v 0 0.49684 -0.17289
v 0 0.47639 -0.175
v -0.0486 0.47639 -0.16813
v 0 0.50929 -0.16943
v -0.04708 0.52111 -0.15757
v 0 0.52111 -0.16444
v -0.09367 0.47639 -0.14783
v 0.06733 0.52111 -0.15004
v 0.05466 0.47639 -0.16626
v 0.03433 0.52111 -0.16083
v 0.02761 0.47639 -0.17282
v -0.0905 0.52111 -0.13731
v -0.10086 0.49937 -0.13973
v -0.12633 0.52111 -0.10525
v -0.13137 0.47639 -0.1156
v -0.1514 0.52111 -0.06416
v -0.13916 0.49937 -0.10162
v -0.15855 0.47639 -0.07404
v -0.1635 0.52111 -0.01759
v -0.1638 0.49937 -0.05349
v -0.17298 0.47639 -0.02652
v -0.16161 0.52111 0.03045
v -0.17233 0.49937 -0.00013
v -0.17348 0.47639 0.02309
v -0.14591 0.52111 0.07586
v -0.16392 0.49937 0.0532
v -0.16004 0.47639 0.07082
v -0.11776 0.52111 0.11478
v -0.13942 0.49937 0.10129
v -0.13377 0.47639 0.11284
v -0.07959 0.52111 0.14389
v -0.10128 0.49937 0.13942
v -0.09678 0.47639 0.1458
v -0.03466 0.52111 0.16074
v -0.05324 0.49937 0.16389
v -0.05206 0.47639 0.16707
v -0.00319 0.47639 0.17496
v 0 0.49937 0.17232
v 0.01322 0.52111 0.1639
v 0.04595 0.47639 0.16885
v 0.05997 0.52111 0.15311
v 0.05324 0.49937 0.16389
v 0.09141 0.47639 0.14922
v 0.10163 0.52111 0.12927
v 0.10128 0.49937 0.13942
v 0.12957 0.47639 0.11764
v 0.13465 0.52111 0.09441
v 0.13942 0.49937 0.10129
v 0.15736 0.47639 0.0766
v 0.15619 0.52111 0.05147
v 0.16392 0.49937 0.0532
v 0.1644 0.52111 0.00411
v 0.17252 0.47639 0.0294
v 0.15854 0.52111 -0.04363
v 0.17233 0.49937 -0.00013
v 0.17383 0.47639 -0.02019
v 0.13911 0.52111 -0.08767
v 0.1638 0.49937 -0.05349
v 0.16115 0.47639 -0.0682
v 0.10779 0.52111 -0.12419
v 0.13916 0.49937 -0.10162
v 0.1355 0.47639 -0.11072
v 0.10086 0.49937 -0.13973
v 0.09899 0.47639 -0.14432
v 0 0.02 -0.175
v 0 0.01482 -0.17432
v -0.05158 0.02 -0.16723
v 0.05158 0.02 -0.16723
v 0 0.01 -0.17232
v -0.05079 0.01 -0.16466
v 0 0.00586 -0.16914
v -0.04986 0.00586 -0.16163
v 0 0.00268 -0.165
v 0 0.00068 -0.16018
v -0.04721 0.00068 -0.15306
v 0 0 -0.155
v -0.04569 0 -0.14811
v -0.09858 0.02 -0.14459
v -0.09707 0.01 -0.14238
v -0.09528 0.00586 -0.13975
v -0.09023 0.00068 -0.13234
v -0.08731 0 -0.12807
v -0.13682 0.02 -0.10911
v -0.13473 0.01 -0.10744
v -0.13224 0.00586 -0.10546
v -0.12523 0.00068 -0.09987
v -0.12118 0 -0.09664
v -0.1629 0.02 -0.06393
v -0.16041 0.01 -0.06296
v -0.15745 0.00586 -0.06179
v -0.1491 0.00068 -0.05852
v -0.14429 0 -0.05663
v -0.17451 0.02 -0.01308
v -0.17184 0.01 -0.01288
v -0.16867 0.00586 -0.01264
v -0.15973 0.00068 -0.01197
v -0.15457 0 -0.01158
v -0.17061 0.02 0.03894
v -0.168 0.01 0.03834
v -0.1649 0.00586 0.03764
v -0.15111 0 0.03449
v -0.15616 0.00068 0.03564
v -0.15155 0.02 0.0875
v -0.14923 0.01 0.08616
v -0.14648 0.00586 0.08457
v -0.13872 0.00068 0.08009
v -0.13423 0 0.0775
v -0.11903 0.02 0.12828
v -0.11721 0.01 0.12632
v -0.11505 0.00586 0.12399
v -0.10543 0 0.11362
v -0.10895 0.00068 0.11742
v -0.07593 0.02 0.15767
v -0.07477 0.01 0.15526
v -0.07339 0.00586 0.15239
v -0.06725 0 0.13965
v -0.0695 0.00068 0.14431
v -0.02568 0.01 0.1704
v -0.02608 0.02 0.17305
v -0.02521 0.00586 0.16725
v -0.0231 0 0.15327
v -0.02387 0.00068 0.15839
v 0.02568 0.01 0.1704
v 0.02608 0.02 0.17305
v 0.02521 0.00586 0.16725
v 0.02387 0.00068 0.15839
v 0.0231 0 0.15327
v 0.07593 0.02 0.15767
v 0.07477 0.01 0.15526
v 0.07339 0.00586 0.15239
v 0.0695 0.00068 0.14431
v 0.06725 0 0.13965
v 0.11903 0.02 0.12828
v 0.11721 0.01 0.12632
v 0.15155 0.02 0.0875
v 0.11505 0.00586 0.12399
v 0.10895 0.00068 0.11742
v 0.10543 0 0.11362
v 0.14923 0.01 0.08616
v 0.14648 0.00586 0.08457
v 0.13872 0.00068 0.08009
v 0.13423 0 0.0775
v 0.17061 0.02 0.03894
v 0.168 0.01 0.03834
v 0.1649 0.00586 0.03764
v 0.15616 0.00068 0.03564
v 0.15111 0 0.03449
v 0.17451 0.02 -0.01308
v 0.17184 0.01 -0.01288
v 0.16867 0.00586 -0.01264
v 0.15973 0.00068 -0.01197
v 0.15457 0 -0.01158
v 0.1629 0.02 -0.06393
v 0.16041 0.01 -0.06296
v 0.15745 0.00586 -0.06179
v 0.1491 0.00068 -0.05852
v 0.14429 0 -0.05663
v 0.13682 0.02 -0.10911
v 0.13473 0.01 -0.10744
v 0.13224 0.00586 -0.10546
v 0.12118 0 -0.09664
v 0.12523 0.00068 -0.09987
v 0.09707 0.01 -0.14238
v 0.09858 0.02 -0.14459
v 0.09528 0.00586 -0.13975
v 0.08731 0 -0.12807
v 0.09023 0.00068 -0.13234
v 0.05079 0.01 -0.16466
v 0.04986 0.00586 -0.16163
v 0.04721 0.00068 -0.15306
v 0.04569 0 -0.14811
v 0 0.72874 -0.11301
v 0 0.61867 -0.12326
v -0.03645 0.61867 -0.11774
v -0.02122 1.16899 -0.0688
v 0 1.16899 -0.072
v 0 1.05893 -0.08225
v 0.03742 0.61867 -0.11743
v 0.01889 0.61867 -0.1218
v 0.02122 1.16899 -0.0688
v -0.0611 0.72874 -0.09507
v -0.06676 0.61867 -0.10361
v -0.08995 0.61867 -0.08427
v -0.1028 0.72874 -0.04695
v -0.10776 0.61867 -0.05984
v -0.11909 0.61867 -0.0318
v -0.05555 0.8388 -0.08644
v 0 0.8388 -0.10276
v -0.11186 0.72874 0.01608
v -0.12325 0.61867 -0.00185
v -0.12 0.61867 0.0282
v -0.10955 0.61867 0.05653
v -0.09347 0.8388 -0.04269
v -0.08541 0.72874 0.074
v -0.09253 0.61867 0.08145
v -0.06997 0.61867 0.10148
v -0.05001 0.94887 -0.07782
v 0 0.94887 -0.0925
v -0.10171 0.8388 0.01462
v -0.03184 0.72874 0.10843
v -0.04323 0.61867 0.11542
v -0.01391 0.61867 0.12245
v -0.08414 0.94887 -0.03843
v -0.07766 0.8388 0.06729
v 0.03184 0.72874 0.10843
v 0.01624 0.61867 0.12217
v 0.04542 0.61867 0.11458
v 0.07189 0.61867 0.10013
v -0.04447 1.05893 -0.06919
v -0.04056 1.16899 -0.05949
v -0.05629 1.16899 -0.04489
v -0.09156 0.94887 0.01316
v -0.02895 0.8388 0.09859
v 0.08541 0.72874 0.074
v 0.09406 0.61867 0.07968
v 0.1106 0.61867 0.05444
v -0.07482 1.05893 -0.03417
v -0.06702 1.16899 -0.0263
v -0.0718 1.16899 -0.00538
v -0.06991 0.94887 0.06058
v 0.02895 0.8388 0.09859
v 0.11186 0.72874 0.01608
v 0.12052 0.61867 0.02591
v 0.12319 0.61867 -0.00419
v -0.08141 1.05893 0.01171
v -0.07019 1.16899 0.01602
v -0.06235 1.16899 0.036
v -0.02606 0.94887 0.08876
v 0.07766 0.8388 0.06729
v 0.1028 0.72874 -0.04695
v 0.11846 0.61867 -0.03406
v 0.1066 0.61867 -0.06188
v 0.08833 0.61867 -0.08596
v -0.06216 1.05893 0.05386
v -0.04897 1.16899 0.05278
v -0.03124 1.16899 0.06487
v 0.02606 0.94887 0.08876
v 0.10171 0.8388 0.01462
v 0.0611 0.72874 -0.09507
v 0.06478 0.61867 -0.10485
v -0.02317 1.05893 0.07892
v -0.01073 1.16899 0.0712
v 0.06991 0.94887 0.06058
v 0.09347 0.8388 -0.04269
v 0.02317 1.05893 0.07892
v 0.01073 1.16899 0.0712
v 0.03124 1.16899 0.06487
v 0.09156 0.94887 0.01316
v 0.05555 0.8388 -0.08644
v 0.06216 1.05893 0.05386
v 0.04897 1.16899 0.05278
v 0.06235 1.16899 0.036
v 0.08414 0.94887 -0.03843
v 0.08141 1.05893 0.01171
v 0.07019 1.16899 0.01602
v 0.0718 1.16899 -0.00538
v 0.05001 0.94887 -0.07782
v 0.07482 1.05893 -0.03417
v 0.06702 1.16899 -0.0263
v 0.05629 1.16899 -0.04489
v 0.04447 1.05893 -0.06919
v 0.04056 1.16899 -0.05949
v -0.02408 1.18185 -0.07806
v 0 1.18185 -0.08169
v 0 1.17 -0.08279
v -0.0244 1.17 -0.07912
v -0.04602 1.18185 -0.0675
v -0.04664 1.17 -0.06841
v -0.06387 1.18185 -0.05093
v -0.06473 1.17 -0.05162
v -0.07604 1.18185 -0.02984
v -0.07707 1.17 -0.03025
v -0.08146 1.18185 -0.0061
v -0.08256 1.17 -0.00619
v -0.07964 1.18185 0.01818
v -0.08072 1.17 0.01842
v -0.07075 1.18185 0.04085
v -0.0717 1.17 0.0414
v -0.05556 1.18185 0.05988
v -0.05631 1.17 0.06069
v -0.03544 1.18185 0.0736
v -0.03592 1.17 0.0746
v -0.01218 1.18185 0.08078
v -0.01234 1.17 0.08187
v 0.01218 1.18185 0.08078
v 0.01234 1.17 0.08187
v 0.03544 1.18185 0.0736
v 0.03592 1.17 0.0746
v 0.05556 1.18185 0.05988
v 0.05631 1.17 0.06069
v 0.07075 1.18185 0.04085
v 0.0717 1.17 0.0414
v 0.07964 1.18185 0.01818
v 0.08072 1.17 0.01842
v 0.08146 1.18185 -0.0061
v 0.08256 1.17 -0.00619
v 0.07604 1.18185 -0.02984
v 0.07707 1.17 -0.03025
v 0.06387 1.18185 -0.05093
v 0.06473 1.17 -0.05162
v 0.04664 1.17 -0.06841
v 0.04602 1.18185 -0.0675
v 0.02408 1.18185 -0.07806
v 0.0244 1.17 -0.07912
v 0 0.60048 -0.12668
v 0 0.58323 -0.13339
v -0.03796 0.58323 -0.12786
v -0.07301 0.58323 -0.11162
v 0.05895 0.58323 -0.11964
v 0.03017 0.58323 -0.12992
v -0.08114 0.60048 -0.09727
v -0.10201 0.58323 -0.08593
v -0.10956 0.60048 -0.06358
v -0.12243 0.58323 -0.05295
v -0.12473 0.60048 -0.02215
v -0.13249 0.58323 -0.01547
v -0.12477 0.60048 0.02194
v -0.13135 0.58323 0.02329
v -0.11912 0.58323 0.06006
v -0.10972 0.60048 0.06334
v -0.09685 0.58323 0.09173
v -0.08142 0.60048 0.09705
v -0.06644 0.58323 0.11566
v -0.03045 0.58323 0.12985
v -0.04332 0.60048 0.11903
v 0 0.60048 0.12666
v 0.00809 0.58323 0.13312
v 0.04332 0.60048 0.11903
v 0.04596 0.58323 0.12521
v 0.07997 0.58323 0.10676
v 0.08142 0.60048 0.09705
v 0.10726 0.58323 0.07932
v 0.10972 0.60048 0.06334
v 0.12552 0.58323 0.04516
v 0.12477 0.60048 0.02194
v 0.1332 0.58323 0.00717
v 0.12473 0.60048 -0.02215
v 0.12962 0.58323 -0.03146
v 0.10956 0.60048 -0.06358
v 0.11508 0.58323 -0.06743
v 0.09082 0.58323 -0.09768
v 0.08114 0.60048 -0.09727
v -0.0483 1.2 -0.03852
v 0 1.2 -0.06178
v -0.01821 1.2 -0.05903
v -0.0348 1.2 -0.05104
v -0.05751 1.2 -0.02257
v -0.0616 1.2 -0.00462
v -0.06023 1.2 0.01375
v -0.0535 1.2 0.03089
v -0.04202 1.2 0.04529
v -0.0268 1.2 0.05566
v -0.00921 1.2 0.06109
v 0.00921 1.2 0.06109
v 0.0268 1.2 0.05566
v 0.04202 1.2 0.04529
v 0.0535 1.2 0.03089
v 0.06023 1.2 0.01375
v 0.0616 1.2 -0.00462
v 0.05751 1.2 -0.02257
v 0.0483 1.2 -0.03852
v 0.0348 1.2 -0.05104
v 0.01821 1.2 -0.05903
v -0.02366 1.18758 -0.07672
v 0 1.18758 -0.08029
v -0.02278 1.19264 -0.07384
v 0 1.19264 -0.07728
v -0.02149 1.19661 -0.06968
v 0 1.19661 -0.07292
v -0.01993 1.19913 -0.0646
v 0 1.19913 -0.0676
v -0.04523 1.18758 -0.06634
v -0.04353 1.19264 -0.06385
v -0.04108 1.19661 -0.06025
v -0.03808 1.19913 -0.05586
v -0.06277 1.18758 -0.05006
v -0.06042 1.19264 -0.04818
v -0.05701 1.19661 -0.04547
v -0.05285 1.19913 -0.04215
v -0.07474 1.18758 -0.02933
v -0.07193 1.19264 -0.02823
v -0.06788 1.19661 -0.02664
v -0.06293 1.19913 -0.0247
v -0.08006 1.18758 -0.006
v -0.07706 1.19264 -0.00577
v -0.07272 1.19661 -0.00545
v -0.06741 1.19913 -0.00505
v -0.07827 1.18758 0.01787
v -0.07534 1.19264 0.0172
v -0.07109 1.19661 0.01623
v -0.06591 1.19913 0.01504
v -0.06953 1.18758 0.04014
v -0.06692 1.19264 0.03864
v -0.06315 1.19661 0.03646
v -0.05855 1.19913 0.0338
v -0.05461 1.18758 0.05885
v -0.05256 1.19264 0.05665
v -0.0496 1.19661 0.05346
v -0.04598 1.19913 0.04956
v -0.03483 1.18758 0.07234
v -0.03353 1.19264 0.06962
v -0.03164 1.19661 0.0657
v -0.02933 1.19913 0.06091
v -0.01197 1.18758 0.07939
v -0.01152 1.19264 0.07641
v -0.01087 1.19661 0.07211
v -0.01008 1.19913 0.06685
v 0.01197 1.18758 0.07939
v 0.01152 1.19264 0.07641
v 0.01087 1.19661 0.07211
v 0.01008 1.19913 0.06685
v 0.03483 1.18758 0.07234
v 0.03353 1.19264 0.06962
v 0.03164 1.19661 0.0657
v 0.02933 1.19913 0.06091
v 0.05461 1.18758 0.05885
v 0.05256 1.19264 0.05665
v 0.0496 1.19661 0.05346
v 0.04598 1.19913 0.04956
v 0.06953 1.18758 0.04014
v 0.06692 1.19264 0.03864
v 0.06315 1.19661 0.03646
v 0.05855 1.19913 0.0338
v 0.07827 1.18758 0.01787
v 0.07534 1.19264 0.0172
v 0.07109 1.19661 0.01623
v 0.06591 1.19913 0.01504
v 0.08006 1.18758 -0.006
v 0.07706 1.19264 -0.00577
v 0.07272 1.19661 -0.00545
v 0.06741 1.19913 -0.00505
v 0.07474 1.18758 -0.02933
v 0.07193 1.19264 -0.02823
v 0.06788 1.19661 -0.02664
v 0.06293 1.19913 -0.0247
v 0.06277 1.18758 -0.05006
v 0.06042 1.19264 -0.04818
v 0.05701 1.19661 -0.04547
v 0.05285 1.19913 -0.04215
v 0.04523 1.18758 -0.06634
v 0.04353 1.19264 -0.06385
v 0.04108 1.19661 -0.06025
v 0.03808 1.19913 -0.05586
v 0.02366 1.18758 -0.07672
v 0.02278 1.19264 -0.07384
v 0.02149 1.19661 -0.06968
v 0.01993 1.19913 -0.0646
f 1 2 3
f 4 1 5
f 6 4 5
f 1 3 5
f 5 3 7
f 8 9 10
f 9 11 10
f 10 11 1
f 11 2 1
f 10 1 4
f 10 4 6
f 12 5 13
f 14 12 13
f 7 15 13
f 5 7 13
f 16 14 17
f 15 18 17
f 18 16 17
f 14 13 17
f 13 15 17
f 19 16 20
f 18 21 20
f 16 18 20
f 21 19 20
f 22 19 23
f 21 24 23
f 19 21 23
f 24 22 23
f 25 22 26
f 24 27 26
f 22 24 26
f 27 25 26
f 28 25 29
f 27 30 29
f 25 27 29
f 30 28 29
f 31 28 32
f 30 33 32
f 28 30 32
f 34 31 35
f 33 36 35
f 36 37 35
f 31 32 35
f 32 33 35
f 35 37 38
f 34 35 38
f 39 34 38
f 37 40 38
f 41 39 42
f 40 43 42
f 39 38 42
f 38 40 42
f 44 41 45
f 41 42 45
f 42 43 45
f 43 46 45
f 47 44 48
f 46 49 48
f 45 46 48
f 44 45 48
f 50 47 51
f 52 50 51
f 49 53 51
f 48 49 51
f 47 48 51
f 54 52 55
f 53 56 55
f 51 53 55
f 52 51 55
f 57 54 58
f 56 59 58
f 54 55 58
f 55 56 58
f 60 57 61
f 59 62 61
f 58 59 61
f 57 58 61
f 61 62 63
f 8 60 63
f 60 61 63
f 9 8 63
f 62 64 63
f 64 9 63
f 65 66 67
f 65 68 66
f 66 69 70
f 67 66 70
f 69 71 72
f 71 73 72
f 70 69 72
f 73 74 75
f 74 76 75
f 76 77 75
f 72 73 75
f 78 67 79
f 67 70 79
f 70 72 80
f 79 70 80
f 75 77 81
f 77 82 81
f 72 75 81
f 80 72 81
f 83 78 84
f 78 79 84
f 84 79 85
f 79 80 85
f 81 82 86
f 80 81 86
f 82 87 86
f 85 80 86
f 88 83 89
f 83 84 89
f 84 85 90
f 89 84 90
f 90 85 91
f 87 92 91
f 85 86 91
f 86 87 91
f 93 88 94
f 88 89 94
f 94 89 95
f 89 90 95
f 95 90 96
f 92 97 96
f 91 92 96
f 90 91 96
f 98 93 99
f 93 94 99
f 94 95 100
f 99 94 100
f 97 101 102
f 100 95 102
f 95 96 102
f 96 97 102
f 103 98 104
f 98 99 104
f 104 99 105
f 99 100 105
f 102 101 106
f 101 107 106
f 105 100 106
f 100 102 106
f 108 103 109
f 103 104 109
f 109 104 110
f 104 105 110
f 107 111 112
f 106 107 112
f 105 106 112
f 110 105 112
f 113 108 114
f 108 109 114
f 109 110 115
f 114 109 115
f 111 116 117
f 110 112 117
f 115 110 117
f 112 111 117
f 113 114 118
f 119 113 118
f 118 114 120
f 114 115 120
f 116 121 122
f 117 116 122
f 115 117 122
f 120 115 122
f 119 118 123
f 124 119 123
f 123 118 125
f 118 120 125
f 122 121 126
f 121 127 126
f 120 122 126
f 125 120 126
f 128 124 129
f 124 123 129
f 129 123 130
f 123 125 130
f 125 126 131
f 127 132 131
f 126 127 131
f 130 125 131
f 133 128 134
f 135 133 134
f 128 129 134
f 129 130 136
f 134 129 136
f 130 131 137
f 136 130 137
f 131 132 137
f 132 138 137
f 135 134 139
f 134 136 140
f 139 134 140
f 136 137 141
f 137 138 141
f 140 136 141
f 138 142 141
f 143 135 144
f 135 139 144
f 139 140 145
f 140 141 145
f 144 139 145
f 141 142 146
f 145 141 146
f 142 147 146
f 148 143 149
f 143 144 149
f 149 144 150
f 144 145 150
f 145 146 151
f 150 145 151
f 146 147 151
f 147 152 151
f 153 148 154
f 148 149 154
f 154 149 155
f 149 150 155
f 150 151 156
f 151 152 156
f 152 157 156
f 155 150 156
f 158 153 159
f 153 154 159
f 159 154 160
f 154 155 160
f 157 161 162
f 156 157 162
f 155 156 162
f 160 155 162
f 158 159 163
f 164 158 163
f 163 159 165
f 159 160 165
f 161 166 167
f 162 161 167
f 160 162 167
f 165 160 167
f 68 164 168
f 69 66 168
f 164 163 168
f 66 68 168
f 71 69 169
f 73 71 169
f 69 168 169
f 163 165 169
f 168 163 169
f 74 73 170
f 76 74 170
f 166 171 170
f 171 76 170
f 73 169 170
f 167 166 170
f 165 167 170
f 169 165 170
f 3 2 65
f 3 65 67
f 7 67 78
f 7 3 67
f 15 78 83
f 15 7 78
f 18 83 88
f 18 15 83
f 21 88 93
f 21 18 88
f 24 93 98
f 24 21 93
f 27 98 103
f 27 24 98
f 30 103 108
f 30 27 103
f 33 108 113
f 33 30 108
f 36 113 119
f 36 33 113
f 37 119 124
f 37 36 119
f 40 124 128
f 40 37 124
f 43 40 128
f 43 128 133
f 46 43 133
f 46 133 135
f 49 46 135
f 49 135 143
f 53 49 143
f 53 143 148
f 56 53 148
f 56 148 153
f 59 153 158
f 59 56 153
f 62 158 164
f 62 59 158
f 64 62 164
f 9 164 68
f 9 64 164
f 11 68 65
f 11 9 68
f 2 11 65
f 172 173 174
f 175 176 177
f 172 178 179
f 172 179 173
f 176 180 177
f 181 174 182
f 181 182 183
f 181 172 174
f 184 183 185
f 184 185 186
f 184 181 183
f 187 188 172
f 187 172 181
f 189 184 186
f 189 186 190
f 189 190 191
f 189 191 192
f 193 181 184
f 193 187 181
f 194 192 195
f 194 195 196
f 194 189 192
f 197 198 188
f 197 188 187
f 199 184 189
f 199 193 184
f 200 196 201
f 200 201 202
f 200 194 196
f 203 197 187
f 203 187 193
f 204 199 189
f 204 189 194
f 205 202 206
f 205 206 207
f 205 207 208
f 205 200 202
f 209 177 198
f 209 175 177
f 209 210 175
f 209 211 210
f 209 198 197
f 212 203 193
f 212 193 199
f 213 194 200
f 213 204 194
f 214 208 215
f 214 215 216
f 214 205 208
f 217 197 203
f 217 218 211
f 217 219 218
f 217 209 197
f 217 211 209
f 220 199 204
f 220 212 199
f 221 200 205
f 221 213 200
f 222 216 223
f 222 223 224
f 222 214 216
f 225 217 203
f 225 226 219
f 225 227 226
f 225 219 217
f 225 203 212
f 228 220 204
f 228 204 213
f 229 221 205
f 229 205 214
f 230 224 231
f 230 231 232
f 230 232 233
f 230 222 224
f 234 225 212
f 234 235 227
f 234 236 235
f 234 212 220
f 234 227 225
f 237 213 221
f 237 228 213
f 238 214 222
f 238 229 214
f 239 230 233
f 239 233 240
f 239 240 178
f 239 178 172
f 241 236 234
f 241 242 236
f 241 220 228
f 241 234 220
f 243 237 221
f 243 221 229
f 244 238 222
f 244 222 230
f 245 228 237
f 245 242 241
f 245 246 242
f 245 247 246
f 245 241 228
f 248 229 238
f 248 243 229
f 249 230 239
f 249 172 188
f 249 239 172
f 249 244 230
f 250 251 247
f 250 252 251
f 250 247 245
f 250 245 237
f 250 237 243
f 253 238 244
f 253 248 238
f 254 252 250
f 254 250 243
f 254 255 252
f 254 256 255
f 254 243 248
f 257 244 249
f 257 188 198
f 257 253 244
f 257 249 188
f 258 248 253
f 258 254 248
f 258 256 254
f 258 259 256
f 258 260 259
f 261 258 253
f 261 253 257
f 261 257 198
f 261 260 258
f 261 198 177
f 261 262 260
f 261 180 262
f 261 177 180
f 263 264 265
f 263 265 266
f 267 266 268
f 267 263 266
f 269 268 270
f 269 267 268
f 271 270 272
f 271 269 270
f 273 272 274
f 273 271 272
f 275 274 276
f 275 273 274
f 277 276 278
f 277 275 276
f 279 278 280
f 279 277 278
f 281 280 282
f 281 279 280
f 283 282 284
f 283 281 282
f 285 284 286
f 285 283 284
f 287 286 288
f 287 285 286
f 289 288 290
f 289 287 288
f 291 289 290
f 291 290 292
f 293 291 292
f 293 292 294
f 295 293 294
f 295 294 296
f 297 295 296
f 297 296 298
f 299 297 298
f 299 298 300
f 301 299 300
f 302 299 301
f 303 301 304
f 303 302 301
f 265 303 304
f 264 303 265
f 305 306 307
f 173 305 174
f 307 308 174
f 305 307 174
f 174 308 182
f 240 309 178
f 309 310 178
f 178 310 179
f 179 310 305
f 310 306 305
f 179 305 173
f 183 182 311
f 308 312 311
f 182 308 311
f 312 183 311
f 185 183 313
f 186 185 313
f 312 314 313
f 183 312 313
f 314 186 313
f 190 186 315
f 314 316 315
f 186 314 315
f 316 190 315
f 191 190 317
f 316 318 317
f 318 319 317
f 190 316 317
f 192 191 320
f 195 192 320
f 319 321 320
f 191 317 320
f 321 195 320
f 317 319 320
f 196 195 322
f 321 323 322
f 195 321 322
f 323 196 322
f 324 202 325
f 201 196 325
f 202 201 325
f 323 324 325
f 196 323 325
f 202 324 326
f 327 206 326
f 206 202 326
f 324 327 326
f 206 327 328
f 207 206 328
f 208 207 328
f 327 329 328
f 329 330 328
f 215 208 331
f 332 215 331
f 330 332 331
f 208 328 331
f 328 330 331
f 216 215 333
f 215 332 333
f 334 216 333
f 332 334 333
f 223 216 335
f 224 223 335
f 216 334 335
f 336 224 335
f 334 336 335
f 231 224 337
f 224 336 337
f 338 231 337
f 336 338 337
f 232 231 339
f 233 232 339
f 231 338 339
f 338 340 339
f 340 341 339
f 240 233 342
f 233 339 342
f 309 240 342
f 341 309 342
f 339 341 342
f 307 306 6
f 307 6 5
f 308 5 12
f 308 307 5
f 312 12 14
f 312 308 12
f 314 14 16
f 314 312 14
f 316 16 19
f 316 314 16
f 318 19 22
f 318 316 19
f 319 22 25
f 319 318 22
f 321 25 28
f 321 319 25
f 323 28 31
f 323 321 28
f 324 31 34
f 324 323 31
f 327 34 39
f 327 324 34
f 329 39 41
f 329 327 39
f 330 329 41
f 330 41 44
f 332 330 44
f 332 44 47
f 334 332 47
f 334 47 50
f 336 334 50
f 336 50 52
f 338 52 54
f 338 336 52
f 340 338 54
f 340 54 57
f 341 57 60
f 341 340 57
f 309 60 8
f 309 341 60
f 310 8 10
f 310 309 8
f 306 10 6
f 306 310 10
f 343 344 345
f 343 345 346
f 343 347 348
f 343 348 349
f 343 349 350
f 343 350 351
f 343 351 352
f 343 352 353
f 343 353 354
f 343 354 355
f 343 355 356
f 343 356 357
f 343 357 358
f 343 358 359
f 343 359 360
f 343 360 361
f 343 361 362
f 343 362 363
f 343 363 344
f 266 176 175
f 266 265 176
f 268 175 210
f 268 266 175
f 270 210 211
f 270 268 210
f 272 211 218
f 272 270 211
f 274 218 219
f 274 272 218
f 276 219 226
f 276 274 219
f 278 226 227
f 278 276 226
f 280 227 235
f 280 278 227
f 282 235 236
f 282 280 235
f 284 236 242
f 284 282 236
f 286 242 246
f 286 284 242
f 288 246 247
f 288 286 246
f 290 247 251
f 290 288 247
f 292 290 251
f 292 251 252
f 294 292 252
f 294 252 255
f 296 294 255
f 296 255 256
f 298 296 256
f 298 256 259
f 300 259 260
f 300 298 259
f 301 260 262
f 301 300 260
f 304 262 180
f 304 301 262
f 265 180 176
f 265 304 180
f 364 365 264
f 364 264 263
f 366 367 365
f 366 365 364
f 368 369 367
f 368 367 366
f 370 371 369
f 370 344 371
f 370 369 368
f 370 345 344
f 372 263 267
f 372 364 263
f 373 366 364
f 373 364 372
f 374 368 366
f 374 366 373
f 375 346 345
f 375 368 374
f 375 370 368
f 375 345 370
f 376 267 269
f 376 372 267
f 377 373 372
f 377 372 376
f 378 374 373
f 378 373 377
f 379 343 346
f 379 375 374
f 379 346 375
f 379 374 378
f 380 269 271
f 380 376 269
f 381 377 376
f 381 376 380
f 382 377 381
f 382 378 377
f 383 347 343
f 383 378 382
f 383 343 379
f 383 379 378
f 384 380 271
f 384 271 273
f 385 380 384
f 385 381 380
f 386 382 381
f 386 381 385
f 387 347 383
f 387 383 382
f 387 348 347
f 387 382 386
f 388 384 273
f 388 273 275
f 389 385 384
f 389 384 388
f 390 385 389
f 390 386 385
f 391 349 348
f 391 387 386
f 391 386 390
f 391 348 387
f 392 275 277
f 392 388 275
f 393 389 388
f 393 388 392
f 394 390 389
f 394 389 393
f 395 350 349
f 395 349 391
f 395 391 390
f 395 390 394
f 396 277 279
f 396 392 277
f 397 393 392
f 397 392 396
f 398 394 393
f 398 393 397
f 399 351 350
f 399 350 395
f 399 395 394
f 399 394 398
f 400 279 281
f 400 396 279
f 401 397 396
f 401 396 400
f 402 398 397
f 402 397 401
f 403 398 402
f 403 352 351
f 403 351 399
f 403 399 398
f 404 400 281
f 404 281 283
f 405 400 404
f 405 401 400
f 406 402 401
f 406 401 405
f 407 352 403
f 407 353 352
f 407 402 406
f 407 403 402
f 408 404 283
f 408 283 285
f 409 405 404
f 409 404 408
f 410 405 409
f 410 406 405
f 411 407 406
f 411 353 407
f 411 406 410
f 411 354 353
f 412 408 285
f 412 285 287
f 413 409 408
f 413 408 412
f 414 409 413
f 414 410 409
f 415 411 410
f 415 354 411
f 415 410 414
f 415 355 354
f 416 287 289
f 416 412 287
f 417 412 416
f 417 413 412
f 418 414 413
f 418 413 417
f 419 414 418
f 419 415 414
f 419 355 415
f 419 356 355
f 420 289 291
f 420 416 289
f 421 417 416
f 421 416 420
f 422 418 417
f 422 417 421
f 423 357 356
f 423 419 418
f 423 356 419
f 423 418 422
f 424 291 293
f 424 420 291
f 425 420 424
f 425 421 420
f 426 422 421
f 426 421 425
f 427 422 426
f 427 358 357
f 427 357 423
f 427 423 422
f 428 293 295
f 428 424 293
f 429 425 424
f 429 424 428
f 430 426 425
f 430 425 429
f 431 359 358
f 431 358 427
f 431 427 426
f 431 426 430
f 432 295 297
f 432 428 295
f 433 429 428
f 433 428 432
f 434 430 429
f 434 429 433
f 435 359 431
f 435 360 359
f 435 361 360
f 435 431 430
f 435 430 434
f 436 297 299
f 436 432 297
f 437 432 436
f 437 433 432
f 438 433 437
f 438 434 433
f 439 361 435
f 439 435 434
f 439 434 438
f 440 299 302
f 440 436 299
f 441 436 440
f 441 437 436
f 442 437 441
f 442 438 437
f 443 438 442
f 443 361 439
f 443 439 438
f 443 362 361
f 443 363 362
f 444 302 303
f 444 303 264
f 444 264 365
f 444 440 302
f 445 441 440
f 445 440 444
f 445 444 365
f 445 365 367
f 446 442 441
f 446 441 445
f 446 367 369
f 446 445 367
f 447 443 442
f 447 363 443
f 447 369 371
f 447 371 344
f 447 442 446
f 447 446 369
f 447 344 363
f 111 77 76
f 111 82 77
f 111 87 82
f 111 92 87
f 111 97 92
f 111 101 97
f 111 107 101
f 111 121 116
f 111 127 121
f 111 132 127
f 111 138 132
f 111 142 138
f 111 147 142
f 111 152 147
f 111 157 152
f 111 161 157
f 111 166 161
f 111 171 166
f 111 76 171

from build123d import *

# Parameters (mm, degrees)
FILLET1_R = 0.1
FILLET2_R = 0.02


with BuildPart() as part:
    # Sketch1 → Revolve1 (revolve)
    with BuildSketch(Plane.XY, mode=Mode.PRIVATE) as revolve1_sk:
        Polygon((0, 0), (-0.175, 0), (-0.175, 0.5), (-0.125, 0.6), (-0.072, 1.168994536), (-0.082794403, 1.17), (-0.08, 1.2), (0, 1.2), align=None)
    revolve(revolve1_sk.sketch.rotate(Axis((0, 0, 0), (0, 1, 0)), 270), axis=Axis((0, 0, 0), (0, 1, 0)))

    # Fillet1
    fillet1_edges = [part.edges().sort_by_distance(p)[0] for p in [
        (0, 0.6, 0.125),
        (0, 0.5, 0.175),
    ]]
    fillet(fillet1_edges, radius=FILLET1_R)

    # Fillet2
    fillet2_edges = [part.edges().sort_by_distance(p)[0] for p in [
        (0, 1.2, 0.08),
        (0, 0, 0.175),
    ]]
    fillet(fillet2_edges, radius=FILLET2_R)


solid = part.part
